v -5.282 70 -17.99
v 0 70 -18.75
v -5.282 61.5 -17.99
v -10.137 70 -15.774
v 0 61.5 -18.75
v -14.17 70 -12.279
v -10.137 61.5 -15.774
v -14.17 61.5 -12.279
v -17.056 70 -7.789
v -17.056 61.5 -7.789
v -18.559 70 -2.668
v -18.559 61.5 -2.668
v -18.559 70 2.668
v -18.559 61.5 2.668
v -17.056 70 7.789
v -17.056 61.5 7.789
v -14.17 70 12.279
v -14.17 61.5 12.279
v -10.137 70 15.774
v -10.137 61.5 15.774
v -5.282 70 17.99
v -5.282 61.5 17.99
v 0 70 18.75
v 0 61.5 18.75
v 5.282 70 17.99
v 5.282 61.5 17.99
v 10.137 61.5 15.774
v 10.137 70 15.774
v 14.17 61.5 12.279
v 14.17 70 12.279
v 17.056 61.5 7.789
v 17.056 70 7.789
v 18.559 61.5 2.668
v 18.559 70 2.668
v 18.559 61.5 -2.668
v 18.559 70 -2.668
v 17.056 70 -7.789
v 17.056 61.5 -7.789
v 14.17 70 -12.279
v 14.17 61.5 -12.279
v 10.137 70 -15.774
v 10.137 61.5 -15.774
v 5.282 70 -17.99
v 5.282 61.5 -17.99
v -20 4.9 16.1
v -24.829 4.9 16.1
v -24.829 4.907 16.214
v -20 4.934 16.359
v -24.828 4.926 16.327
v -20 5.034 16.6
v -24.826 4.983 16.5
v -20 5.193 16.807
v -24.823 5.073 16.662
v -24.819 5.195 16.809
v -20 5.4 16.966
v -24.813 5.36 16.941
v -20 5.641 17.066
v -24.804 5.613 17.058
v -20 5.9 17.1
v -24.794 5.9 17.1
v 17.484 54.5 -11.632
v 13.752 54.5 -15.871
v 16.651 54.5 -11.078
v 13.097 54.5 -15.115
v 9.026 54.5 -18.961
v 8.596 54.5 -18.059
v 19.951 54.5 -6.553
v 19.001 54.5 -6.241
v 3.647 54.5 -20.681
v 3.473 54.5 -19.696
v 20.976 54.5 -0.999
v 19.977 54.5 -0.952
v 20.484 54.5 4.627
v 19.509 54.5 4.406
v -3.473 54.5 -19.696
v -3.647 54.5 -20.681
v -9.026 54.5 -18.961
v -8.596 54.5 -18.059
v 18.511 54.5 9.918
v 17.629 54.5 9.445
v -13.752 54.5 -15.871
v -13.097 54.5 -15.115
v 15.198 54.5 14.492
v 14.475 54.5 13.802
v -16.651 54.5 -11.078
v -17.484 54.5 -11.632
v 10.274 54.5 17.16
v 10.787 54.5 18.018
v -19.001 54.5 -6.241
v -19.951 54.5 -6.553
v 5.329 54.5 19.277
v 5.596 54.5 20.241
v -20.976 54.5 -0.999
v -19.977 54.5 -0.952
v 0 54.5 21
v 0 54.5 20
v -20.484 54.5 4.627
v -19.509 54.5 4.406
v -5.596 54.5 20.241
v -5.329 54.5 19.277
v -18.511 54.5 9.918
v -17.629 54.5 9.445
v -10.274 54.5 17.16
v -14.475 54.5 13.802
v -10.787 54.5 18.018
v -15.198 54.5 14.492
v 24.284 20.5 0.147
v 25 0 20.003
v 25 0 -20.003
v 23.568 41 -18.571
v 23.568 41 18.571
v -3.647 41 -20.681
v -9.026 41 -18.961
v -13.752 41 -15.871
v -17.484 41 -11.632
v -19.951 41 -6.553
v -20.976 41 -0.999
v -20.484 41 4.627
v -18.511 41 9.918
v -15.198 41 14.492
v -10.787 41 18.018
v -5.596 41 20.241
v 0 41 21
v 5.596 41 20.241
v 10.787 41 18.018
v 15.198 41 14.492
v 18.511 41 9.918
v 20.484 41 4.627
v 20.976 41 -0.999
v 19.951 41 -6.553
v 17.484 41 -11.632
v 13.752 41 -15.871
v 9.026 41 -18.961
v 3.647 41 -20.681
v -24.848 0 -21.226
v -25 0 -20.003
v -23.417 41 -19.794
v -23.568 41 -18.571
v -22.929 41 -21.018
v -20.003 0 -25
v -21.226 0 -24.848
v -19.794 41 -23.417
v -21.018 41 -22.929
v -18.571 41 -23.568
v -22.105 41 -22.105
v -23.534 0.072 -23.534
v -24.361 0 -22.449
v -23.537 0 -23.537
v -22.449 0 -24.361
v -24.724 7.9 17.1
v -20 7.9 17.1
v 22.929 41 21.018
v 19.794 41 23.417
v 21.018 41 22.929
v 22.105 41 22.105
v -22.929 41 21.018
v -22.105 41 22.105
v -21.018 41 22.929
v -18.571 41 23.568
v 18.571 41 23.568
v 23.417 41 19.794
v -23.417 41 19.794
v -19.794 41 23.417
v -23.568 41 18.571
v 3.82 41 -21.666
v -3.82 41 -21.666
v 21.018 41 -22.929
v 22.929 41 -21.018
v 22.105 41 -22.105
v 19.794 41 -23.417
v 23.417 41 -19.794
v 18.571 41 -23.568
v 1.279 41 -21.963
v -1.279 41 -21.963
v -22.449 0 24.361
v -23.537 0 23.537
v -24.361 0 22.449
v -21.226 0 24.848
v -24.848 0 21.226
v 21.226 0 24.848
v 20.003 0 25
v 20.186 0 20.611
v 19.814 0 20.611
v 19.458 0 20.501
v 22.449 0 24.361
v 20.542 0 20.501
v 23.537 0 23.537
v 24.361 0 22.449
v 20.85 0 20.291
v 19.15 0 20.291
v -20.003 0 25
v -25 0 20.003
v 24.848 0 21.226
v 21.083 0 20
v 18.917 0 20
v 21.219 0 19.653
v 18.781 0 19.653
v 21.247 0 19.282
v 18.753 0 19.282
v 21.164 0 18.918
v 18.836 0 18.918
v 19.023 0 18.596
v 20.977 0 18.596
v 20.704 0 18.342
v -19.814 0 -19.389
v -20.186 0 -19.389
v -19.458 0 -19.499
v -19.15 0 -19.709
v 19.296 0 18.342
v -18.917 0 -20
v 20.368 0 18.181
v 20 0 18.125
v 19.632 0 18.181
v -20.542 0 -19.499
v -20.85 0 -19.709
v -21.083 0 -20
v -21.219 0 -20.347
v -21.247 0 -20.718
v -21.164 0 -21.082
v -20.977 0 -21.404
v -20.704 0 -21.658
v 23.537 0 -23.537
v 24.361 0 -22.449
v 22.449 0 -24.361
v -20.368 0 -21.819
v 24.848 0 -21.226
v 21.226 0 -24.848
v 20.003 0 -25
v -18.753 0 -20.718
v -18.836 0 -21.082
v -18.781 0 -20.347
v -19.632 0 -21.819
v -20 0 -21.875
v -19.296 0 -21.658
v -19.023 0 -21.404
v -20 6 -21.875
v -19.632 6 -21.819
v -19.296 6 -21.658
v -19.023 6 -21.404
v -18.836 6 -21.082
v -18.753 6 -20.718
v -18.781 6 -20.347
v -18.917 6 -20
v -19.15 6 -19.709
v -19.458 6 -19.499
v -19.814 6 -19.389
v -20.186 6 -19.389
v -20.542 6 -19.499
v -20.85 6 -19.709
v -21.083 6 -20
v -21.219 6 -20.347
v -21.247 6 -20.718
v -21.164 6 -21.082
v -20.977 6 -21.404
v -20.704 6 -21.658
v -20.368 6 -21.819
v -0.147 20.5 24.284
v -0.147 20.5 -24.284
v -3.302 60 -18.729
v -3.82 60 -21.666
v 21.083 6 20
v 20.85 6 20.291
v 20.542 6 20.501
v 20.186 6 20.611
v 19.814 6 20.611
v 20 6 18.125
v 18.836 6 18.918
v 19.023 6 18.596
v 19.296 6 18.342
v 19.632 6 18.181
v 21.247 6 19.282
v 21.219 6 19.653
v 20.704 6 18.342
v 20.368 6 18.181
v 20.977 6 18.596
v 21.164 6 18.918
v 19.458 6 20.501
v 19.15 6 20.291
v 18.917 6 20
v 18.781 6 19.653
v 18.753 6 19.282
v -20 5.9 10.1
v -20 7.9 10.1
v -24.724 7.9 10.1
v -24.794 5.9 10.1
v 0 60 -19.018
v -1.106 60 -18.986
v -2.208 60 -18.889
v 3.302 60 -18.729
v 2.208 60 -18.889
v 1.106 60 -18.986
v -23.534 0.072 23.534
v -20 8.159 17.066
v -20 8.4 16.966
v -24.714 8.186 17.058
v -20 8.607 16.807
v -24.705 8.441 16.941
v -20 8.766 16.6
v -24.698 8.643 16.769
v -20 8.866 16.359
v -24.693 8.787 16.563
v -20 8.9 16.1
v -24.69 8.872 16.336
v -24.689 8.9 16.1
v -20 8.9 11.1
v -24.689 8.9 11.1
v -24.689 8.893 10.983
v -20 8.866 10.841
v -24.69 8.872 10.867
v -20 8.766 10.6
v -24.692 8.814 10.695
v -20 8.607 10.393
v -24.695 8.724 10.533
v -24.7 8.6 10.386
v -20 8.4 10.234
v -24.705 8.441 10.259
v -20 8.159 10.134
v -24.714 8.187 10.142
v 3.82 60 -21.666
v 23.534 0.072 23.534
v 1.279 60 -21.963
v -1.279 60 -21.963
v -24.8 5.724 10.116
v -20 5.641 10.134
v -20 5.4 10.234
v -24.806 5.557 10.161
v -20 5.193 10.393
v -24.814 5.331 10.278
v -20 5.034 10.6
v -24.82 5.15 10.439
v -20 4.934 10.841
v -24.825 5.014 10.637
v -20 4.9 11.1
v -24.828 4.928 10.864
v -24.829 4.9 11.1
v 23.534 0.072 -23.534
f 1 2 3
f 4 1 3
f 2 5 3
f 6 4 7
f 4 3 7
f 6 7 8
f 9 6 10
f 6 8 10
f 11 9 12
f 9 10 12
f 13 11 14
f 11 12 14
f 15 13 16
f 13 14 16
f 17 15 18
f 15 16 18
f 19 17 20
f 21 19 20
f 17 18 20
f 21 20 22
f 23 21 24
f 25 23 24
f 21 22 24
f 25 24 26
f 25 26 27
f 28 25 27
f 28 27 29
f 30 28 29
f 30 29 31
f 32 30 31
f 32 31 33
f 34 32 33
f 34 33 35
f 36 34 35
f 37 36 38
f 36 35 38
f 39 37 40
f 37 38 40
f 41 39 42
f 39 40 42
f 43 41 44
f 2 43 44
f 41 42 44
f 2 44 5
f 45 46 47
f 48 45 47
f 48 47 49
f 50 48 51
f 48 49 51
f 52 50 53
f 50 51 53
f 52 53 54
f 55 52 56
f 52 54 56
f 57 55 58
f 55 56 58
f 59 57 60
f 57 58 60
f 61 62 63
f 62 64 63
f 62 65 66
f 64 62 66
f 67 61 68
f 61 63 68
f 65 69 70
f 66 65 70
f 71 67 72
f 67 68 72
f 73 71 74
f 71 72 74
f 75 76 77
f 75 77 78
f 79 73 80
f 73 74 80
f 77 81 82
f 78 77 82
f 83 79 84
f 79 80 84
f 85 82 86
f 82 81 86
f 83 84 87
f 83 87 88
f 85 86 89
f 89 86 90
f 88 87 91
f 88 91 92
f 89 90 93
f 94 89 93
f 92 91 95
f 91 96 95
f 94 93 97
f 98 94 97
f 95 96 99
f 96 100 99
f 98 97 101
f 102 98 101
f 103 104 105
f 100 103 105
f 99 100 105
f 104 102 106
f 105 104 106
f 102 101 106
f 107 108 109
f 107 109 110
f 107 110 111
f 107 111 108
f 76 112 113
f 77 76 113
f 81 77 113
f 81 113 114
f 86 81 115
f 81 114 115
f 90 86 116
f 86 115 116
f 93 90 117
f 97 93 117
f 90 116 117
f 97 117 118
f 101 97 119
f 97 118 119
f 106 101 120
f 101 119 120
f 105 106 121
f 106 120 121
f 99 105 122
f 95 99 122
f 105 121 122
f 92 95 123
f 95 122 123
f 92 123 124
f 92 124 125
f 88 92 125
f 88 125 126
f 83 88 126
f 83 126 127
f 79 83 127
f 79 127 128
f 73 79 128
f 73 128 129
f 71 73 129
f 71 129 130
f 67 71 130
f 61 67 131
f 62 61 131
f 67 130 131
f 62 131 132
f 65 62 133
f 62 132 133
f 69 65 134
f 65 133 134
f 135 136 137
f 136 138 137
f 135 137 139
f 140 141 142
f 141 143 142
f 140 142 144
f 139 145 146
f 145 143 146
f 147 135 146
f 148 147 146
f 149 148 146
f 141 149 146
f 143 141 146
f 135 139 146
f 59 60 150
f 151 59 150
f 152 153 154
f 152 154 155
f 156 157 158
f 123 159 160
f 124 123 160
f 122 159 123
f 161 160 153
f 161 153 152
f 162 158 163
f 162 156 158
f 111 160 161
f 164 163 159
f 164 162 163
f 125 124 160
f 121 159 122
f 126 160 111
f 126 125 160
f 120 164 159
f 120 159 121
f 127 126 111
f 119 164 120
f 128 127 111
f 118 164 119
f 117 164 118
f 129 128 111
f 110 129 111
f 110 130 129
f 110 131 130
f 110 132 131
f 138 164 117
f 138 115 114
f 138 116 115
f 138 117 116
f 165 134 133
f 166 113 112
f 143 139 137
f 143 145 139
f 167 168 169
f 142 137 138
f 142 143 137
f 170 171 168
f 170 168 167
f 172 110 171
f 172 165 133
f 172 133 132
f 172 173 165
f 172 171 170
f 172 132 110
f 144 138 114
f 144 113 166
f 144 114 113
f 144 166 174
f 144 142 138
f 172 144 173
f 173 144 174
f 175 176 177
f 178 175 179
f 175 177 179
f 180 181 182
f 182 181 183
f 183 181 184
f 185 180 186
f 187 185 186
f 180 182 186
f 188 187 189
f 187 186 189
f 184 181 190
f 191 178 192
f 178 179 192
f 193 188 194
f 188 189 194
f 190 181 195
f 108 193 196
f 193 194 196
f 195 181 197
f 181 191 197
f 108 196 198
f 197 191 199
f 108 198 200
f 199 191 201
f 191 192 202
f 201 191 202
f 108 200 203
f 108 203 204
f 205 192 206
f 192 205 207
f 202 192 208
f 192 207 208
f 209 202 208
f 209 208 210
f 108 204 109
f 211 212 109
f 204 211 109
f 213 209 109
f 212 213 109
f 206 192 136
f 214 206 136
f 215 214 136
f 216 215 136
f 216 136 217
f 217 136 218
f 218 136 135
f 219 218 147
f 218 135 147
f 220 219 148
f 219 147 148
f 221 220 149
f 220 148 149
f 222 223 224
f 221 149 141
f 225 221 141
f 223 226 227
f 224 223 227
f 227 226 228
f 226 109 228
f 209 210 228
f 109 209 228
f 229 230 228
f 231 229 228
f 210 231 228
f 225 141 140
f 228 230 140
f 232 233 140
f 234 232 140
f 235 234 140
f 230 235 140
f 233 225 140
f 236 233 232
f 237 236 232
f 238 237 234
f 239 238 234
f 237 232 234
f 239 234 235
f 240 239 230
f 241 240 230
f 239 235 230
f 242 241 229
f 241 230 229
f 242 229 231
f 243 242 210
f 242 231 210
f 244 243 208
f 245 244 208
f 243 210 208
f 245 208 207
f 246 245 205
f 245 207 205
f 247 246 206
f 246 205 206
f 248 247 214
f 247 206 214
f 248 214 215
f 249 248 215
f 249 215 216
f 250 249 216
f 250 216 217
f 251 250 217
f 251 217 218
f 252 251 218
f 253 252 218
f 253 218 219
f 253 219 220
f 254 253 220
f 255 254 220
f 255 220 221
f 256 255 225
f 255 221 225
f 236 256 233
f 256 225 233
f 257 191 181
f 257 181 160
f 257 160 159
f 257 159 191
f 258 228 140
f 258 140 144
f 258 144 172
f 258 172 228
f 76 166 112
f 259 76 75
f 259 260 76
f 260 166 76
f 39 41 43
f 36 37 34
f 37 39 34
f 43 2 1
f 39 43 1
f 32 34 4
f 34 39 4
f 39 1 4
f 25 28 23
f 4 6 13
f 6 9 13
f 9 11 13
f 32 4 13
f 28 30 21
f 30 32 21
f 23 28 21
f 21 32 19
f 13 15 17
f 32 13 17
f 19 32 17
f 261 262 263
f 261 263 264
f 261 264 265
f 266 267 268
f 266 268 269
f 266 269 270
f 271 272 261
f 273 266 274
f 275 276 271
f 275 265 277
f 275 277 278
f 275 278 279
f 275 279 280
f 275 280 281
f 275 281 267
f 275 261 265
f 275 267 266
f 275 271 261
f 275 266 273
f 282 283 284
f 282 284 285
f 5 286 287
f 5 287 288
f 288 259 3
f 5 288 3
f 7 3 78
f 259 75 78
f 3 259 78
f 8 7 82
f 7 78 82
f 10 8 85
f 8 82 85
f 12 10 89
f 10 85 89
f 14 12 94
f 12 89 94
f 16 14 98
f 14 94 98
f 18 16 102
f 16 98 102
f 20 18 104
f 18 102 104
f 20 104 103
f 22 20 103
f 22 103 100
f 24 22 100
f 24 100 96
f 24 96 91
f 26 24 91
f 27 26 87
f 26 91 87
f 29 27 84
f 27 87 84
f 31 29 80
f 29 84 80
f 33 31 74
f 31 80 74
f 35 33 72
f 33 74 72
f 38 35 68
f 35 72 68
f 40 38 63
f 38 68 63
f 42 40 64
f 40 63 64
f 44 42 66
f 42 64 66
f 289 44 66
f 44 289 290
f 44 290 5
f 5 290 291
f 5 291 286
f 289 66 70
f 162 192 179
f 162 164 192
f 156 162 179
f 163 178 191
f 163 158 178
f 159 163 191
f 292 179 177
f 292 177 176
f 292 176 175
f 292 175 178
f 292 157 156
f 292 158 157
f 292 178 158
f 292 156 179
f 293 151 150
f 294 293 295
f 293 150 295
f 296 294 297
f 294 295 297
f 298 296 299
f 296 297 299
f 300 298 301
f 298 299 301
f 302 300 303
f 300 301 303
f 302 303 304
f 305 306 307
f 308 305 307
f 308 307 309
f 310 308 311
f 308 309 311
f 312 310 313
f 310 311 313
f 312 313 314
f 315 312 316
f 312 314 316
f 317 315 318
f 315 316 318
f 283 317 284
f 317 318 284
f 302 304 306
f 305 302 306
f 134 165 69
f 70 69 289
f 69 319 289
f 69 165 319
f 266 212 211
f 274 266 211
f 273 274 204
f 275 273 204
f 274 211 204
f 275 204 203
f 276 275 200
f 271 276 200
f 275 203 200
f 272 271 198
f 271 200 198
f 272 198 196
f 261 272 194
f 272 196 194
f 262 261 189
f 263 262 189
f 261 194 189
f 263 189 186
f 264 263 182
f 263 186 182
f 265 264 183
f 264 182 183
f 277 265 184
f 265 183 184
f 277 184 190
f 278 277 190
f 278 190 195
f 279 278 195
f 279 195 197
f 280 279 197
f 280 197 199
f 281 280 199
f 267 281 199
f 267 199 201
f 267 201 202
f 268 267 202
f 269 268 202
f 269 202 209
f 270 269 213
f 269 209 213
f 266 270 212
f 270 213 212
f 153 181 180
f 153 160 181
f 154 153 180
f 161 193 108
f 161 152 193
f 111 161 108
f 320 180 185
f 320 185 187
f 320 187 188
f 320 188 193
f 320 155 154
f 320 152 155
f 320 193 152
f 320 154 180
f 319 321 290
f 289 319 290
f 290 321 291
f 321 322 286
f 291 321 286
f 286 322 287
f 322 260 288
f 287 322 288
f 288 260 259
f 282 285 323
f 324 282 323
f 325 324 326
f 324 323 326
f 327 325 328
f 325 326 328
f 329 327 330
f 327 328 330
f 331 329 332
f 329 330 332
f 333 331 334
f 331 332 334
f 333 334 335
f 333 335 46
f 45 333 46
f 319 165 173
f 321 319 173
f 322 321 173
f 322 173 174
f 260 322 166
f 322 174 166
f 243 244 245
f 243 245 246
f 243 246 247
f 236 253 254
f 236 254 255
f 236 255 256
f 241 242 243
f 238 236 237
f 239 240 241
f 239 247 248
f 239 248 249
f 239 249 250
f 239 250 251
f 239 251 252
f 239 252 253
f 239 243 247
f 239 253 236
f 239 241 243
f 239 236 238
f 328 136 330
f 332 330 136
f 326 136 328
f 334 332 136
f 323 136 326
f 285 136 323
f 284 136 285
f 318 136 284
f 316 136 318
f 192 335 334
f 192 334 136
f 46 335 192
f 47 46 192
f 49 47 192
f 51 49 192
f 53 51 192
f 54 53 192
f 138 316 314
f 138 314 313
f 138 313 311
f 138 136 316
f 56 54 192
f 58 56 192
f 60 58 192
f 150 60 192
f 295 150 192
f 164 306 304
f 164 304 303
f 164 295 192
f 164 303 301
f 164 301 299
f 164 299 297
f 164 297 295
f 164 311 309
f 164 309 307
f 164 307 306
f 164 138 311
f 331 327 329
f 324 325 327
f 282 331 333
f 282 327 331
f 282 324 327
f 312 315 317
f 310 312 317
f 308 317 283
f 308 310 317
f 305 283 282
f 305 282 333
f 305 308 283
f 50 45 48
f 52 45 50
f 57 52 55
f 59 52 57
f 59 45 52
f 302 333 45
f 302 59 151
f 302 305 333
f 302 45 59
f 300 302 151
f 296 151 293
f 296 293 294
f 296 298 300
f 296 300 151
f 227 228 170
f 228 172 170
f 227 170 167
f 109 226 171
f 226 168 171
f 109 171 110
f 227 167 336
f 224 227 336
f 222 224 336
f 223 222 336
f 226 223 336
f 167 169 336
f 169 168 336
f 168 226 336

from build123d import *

# Parameters (mm, degrees)
ESBO_O1_W                 = 50
ESBO_O1_H                 = 50
RESSALTO_EXTRUS_O1_DEPTH  = 41
RESSALTO_EXTRUS_O1_TAPER  = 2
FILETE1_R                 = 5
ESBO_O3_R                 = 1.25
CORTE_EXTRUS_O1_DEPTH     = 6
REVOLU_O2_ANGLE           = 10
REVOLU_O2_OTHER_WAY_ANGLE = 10
CORTE_EXTRUS_O2_DEPTH     = 5


with BuildPart() as part:
    # Esboço1 → Ressalto-extrusão1 (new body)
    with BuildSketch(Plane(origin=(0, 0, 0), x_dir=(1, 0, 0), z_dir=(0, 1, 0))):
        Rectangle(ESBO_O1_W, ESBO_O1_H)
    extrude(amount=RESSALTO_EXTRUS_O1_DEPTH, taper=RESSALTO_EXTRUS_O1_TAPER)

    # Esboço2 → Revolução1 (revolve)
    with BuildSketch(Plane(origin=(0, 0, 0), x_dir=(0, 0, -1), z_dir=(1, 0, 0))):
        Polygon((0, 41), (0, 70), (18.75, 70), (18.75, 61.5), (20, 54.5), (21, 54.5), (21, 41), align=None)
    revolve(axis=Axis((0, 41, 0), (0, 1, 0)))

    # Filete1
    filete1_edges = [part.edges().sort_by_distance(p)[0] for p in [
        (24.284124225, 20.5, 24.284124225),
        (-24.284124225, 20.5, 24.284124225),
        (-24.284124225, 20.5, -24.284124225),
        (24.284124225, 20.5, -24.284124225),
    ]]
    fillet(filete1_edges, radius=FILETE1_R)

    # Esboço3 → Corte-extrusão1 (cut)
    with BuildSketch(Plane(origin=(0, 0, 0), x_dir=(-1, 0, 0), z_dir=(0, -1, 0))):
        with Locations(Location((20, 20.625, 0), (0, 0, 90))):
            Circle(ESBO_O3_R)
        with Locations(Location((-20, -19.375, 0), (0, 0, 90))):
            Circle(ESBO_O3_R)
    extrude(amount=-CORTE_EXTRUS_O1_DEPTH, mode=Mode.SUBTRACT)

    # Esboço5 → Revolução2 (revolve)
    with BuildSketch(Plane(origin=(0, 0, 0), x_dir=(0, 0, -1), z_dir=(1, 0, 0))):
        Polygon((19.017857143, 60), (22, 60), (22, 41), (21, 41), (21, 54.5), (20, 54.5), align=None)
    revolve(axis=Axis((0, 41, 0), (0, -1, 0)), revolution_arc=REVOLU_O2_ANGLE)

    # Esboço5 → Revolução2 other way (revolve)
    with BuildSketch(Plane(origin=(0, 0, 0), x_dir=(0, 0, -1), z_dir=(1, 0, 0))):
        Polygon((19.017857143, 60), (22, 60), (22, 41), (21, 41), (21, 54.5), (20, 54.5), align=None)
    revolve(axis=Axis((0, 41, 0), (0, 1, 0)), revolution_arc=REVOLU_O2_OTHER_WAY_ANGLE)

    # Esboço7 → Corte-extrusão2 (cut)
    with BuildSketch(Plane(origin=(-25, 0, 0), x_dir=(0, 0, -1), z_dir=(1, 0, 0))):
        with BuildLine():
            Line((-16.1, 8.9), (-11.1, 8.9))
            ThreePointArc((-11.1, 8.9), (-10.392893219, 8.607106781), (-10.1, 7.9))
            Line((-10.1, 7.9), (-10.1, 5.9))
            ThreePointArc((-10.1, 5.9), (-10.392893219, 5.192893219), (-11.1, 4.9))
            Line((-11.1, 4.9), (-16.1, 4.9))
            ThreePointArc((-16.1, 4.9), (-16.807106781, 5.192893219), (-17.1, 5.9))
            Line((-17.1, 5.9), (-17.1, 7.9))
            ThreePointArc((-17.1, 7.9), (-16.807106781, 8.607106781), (-16.1, 8.9))
        make_face()
    extrude(amount=CORTE_EXTRUS_O2_DEPTH, mode=Mode.SUBTRACT)


solid = part.part
